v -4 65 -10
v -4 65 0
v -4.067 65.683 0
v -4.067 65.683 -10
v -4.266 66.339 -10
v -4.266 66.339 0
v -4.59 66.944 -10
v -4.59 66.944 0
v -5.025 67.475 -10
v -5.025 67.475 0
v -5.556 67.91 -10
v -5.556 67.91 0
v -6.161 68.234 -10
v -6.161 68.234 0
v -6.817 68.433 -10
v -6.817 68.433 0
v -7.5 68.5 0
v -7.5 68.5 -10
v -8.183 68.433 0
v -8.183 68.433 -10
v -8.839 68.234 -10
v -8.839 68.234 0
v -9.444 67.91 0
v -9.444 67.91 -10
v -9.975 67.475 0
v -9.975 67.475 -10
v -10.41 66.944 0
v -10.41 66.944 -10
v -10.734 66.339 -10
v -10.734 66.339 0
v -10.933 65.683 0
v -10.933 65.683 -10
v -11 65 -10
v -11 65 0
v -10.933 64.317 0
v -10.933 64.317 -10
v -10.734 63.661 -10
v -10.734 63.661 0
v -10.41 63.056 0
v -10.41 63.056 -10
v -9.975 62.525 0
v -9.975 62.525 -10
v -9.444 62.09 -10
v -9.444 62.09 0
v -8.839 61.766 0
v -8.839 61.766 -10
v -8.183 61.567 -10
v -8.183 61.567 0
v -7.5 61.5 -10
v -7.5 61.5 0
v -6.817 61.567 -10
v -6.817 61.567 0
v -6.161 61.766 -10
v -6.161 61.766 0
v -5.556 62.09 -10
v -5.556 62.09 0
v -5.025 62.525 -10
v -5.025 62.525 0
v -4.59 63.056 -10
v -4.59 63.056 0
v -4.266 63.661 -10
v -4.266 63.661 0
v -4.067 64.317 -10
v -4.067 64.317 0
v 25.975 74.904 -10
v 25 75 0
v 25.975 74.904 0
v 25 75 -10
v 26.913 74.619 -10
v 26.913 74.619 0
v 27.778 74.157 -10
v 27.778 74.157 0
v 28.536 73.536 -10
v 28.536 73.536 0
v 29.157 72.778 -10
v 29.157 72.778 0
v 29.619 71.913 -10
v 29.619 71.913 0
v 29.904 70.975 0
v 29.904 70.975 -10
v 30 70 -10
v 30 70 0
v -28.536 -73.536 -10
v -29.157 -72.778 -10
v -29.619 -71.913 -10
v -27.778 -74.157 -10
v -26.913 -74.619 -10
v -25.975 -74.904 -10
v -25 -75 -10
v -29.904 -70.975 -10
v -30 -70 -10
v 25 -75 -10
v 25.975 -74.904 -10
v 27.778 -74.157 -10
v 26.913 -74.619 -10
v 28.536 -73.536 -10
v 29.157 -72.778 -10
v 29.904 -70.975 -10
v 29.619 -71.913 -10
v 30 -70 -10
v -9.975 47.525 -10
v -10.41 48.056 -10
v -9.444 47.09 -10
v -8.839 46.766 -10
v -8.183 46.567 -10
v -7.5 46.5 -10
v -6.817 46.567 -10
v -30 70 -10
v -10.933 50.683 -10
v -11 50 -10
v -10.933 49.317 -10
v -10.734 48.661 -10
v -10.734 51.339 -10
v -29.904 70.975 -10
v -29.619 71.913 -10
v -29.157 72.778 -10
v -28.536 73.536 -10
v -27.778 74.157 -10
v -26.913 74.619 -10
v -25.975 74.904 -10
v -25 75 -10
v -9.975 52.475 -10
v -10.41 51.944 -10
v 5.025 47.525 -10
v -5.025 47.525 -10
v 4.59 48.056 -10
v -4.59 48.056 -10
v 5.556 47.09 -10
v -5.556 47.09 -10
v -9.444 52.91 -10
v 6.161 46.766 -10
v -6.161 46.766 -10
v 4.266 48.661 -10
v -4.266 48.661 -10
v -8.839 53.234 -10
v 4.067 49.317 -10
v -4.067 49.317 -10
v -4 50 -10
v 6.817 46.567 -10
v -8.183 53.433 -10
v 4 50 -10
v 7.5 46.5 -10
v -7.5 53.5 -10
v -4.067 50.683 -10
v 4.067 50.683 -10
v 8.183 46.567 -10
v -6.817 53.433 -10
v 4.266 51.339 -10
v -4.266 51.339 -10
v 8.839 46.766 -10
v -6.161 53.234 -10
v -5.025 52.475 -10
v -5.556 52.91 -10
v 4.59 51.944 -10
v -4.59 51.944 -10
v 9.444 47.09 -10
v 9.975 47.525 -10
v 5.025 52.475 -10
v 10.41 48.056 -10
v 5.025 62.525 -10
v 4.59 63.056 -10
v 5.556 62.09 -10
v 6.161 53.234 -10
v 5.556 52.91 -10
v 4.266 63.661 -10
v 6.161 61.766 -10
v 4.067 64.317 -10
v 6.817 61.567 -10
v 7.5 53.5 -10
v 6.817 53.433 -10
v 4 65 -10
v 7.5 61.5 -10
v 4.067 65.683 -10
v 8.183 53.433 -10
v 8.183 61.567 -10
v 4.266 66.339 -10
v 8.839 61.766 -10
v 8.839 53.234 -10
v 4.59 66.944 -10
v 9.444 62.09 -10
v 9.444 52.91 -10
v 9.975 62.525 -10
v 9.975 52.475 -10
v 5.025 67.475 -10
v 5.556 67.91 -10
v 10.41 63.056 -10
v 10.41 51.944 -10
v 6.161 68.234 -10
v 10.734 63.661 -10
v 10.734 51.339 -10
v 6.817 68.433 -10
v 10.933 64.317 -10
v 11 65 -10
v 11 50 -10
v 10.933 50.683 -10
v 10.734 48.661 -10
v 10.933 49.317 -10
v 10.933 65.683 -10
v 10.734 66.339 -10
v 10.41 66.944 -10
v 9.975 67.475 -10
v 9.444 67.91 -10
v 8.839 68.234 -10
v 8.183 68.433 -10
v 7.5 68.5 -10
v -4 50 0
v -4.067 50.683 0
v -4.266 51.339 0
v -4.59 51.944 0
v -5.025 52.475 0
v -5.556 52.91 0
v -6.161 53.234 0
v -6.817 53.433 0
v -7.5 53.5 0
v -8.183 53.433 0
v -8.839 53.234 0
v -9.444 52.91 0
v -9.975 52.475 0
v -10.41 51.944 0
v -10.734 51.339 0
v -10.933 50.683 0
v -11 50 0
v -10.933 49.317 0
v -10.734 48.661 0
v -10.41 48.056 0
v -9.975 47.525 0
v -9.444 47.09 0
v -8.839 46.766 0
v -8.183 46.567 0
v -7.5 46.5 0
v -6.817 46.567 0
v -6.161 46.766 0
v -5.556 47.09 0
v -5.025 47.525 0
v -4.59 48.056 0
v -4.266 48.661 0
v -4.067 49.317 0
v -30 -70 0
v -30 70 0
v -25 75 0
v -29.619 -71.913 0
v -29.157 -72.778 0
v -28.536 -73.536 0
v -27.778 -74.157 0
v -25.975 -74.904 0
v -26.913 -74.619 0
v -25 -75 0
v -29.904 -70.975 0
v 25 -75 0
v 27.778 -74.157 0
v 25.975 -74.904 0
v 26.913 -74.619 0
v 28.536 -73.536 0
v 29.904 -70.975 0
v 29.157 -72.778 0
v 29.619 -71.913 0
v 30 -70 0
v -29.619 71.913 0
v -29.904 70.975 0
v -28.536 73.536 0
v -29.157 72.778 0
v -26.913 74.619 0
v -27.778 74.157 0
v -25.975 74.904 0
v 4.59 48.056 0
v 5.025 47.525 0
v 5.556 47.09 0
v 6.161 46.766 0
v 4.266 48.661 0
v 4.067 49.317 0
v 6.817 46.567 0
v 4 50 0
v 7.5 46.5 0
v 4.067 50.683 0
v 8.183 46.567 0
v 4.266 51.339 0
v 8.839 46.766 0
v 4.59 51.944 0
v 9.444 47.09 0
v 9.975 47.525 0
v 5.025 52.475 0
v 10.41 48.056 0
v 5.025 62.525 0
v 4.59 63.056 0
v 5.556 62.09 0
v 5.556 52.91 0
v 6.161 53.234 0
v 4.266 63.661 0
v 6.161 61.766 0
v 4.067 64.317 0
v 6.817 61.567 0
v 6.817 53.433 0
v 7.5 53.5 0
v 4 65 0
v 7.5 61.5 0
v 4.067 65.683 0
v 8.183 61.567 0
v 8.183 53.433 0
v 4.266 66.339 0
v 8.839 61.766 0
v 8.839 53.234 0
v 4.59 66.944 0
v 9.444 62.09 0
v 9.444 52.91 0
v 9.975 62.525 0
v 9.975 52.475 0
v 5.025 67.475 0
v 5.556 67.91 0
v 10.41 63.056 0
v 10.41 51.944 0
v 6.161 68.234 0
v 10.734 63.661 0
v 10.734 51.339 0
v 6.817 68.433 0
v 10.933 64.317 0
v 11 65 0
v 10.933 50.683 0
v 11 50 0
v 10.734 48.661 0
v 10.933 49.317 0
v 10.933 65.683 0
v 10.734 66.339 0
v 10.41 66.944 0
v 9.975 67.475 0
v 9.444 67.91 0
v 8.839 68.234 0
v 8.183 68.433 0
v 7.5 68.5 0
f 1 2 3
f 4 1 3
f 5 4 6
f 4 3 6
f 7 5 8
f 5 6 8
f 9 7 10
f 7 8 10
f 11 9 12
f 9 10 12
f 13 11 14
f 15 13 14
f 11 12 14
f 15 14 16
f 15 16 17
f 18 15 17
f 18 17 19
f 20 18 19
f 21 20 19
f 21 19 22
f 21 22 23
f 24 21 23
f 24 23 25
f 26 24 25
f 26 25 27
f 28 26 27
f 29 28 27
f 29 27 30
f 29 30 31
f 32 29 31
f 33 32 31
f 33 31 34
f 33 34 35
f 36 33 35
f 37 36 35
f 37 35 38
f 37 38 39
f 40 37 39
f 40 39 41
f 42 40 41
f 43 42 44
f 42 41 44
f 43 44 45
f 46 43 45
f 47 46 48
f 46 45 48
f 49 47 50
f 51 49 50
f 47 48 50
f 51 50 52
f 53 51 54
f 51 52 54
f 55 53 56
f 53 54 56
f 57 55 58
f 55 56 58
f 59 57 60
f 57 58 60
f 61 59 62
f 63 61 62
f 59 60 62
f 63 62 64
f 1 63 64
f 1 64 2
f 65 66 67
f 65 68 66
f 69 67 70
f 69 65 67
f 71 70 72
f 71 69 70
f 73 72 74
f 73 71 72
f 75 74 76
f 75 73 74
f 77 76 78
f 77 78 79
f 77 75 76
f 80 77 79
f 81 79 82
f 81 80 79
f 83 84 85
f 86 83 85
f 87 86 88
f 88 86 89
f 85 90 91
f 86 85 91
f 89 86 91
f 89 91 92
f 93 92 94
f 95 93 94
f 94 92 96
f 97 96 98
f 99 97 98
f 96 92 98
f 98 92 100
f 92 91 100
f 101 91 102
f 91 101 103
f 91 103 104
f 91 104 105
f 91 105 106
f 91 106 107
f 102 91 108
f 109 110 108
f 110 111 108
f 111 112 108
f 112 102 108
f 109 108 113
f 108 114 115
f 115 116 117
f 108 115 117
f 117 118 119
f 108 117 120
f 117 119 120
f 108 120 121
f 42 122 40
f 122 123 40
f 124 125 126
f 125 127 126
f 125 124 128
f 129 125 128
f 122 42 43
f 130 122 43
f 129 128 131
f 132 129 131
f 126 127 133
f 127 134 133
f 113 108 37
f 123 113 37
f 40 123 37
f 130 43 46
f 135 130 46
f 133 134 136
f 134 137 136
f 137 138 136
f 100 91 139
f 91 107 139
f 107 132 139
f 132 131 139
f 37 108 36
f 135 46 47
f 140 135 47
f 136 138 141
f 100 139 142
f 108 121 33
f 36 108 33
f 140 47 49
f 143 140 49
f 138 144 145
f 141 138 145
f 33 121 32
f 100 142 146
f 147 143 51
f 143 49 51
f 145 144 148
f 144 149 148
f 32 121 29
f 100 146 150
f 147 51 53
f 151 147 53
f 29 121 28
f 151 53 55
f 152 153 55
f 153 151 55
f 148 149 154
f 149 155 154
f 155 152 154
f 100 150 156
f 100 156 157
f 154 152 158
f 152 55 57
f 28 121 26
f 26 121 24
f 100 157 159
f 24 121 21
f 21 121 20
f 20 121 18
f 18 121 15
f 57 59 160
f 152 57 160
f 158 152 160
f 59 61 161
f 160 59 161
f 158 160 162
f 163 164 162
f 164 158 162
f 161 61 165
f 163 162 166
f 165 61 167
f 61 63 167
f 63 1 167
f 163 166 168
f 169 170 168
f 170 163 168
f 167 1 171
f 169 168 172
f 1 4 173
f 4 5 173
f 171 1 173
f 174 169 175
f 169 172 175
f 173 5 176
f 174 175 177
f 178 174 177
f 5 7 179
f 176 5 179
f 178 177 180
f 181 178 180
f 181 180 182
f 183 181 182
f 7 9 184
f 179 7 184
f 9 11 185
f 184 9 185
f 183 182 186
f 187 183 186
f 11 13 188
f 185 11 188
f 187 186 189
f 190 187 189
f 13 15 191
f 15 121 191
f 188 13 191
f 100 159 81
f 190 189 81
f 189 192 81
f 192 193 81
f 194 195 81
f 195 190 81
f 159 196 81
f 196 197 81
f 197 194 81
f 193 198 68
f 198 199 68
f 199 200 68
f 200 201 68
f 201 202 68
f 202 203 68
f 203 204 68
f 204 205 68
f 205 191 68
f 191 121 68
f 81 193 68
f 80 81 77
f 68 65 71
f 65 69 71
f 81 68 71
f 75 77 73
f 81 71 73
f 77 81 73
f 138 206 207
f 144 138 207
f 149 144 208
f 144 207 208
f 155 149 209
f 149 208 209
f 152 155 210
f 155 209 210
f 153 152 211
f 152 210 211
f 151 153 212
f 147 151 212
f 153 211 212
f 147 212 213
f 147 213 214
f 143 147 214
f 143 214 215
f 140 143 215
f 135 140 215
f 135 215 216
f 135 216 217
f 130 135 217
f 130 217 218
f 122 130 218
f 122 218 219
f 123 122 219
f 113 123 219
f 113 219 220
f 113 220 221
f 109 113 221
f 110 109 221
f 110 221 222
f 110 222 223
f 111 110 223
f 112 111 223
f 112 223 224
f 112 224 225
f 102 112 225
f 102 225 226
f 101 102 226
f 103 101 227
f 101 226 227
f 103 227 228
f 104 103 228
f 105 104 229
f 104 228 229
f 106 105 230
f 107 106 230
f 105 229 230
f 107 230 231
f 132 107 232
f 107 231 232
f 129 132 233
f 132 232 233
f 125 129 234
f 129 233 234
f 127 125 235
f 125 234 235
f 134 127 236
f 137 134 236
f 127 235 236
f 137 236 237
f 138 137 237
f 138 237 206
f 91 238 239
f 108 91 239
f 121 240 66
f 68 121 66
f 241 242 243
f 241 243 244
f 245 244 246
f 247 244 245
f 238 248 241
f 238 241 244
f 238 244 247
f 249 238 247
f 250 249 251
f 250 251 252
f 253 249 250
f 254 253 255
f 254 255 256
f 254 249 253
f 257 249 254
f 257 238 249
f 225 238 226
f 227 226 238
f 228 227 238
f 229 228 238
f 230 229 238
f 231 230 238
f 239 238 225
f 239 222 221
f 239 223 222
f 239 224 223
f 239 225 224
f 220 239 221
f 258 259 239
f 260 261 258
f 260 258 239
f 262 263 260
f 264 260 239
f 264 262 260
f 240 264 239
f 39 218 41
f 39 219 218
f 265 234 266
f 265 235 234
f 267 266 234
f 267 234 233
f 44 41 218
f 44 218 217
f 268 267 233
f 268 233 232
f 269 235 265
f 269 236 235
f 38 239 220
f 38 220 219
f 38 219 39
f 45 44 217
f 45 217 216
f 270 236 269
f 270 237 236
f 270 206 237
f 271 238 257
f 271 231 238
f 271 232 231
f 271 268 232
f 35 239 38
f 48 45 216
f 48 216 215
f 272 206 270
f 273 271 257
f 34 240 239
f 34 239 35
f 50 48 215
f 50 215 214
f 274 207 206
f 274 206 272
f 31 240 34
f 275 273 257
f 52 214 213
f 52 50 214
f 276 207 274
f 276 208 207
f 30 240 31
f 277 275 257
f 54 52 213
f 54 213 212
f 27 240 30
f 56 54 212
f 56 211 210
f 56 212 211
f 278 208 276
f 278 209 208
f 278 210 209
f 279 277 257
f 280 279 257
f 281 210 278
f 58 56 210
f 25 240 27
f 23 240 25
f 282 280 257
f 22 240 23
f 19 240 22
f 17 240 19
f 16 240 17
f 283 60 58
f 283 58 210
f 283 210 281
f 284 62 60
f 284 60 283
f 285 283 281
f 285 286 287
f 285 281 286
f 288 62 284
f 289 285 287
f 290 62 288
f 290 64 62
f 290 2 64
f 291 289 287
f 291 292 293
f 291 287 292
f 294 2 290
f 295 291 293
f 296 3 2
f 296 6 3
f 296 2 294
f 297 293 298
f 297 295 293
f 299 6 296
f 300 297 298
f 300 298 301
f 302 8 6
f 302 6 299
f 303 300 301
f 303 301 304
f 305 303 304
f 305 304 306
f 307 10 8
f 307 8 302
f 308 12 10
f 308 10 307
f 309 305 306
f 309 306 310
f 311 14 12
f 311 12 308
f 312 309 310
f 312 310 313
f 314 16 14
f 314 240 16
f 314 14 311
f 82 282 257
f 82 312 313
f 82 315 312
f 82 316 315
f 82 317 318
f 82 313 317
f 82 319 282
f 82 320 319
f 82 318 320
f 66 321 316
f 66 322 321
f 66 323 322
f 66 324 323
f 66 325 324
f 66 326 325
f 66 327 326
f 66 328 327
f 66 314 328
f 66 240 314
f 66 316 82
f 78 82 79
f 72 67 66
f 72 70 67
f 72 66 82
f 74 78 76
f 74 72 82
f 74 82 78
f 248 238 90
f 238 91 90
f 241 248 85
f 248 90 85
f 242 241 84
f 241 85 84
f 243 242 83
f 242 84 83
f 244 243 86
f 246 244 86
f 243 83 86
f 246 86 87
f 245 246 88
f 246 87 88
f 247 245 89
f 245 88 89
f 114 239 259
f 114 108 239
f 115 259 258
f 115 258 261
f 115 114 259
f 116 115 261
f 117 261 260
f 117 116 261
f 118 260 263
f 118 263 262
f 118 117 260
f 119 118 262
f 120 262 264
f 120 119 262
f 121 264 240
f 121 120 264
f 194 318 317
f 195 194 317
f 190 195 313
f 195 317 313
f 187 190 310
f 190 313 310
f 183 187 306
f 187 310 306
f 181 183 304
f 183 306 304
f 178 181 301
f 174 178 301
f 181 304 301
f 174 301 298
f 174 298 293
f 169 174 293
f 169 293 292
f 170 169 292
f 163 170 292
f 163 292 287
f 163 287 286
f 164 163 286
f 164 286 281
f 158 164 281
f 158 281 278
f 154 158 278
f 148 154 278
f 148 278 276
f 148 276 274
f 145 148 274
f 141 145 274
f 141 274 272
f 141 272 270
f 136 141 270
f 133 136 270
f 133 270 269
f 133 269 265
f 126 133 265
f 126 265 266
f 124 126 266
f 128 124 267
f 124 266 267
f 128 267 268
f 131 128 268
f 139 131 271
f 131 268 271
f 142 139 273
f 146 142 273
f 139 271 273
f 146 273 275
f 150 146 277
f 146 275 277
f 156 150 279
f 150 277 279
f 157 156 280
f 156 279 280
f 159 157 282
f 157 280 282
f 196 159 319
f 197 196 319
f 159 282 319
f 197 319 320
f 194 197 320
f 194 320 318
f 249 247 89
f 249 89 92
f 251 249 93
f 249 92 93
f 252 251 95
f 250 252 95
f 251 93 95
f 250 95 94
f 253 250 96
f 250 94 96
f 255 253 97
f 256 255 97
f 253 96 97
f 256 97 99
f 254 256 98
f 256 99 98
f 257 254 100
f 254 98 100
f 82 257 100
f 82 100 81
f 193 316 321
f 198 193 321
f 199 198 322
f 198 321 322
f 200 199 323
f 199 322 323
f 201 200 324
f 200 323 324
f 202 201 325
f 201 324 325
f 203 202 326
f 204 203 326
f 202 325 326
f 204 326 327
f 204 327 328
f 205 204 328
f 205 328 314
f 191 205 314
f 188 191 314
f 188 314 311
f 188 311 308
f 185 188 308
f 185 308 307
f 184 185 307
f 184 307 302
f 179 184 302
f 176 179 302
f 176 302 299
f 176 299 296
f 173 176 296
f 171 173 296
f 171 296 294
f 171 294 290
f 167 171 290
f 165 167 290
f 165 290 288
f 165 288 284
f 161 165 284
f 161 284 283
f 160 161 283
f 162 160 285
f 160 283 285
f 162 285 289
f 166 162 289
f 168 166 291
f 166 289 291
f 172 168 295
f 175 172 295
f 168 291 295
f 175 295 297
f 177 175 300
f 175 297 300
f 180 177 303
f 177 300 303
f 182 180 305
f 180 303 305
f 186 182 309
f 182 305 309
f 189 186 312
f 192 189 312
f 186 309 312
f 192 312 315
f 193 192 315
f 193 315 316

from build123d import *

# Parameters (mm, degrees)
IZIM1_W               = 60
IZIM1_H               = 150
TABAN_FLAN_1_DEPTH    = 10
IZIM6_R               = 3.5
KES_EKSTR_ZYON1_DEPTH = 26
RADYUS1_R             = 5


# Sheet-metal steps are written as plain solids
with BuildPart() as part:
    # Çizim1 → Taban-Flanş1 (new body)
    with BuildSketch(Plane.XY):
        Rectangle(IZIM1_W, IZIM1_H)
    extrude(amount=-TABAN_FLAN_1_DEPTH)

    # Çizim6 → Kes-Ekstrüzyon1 (cut)
    with BuildSketch(Plane.XY):
        with Locations((7.5, 65)):
            Circle(IZIM6_R)
        with Locations((-7.5, 65)):
            Circle(IZIM6_R)
        with Locations((7.5, 50)):
            Circle(IZIM6_R)
        with Locations((-7.5, 50)):
            Circle(IZIM6_R)
    extrude(amount=-KES_EKSTR_ZYON1_DEPTH, mode=Mode.SUBTRACT)

    # Radyus1
    radyus1_edges = [part.edges().sort_by_distance(p)[0] for p in [
        (30, -75, -5),
        (-30, -75, -5),
        (-30, 75, -5),
        (30, 75, -5),
    ]]
    fillet(radyus1_edges, radius=RADYUS1_R)


solid = part.part
